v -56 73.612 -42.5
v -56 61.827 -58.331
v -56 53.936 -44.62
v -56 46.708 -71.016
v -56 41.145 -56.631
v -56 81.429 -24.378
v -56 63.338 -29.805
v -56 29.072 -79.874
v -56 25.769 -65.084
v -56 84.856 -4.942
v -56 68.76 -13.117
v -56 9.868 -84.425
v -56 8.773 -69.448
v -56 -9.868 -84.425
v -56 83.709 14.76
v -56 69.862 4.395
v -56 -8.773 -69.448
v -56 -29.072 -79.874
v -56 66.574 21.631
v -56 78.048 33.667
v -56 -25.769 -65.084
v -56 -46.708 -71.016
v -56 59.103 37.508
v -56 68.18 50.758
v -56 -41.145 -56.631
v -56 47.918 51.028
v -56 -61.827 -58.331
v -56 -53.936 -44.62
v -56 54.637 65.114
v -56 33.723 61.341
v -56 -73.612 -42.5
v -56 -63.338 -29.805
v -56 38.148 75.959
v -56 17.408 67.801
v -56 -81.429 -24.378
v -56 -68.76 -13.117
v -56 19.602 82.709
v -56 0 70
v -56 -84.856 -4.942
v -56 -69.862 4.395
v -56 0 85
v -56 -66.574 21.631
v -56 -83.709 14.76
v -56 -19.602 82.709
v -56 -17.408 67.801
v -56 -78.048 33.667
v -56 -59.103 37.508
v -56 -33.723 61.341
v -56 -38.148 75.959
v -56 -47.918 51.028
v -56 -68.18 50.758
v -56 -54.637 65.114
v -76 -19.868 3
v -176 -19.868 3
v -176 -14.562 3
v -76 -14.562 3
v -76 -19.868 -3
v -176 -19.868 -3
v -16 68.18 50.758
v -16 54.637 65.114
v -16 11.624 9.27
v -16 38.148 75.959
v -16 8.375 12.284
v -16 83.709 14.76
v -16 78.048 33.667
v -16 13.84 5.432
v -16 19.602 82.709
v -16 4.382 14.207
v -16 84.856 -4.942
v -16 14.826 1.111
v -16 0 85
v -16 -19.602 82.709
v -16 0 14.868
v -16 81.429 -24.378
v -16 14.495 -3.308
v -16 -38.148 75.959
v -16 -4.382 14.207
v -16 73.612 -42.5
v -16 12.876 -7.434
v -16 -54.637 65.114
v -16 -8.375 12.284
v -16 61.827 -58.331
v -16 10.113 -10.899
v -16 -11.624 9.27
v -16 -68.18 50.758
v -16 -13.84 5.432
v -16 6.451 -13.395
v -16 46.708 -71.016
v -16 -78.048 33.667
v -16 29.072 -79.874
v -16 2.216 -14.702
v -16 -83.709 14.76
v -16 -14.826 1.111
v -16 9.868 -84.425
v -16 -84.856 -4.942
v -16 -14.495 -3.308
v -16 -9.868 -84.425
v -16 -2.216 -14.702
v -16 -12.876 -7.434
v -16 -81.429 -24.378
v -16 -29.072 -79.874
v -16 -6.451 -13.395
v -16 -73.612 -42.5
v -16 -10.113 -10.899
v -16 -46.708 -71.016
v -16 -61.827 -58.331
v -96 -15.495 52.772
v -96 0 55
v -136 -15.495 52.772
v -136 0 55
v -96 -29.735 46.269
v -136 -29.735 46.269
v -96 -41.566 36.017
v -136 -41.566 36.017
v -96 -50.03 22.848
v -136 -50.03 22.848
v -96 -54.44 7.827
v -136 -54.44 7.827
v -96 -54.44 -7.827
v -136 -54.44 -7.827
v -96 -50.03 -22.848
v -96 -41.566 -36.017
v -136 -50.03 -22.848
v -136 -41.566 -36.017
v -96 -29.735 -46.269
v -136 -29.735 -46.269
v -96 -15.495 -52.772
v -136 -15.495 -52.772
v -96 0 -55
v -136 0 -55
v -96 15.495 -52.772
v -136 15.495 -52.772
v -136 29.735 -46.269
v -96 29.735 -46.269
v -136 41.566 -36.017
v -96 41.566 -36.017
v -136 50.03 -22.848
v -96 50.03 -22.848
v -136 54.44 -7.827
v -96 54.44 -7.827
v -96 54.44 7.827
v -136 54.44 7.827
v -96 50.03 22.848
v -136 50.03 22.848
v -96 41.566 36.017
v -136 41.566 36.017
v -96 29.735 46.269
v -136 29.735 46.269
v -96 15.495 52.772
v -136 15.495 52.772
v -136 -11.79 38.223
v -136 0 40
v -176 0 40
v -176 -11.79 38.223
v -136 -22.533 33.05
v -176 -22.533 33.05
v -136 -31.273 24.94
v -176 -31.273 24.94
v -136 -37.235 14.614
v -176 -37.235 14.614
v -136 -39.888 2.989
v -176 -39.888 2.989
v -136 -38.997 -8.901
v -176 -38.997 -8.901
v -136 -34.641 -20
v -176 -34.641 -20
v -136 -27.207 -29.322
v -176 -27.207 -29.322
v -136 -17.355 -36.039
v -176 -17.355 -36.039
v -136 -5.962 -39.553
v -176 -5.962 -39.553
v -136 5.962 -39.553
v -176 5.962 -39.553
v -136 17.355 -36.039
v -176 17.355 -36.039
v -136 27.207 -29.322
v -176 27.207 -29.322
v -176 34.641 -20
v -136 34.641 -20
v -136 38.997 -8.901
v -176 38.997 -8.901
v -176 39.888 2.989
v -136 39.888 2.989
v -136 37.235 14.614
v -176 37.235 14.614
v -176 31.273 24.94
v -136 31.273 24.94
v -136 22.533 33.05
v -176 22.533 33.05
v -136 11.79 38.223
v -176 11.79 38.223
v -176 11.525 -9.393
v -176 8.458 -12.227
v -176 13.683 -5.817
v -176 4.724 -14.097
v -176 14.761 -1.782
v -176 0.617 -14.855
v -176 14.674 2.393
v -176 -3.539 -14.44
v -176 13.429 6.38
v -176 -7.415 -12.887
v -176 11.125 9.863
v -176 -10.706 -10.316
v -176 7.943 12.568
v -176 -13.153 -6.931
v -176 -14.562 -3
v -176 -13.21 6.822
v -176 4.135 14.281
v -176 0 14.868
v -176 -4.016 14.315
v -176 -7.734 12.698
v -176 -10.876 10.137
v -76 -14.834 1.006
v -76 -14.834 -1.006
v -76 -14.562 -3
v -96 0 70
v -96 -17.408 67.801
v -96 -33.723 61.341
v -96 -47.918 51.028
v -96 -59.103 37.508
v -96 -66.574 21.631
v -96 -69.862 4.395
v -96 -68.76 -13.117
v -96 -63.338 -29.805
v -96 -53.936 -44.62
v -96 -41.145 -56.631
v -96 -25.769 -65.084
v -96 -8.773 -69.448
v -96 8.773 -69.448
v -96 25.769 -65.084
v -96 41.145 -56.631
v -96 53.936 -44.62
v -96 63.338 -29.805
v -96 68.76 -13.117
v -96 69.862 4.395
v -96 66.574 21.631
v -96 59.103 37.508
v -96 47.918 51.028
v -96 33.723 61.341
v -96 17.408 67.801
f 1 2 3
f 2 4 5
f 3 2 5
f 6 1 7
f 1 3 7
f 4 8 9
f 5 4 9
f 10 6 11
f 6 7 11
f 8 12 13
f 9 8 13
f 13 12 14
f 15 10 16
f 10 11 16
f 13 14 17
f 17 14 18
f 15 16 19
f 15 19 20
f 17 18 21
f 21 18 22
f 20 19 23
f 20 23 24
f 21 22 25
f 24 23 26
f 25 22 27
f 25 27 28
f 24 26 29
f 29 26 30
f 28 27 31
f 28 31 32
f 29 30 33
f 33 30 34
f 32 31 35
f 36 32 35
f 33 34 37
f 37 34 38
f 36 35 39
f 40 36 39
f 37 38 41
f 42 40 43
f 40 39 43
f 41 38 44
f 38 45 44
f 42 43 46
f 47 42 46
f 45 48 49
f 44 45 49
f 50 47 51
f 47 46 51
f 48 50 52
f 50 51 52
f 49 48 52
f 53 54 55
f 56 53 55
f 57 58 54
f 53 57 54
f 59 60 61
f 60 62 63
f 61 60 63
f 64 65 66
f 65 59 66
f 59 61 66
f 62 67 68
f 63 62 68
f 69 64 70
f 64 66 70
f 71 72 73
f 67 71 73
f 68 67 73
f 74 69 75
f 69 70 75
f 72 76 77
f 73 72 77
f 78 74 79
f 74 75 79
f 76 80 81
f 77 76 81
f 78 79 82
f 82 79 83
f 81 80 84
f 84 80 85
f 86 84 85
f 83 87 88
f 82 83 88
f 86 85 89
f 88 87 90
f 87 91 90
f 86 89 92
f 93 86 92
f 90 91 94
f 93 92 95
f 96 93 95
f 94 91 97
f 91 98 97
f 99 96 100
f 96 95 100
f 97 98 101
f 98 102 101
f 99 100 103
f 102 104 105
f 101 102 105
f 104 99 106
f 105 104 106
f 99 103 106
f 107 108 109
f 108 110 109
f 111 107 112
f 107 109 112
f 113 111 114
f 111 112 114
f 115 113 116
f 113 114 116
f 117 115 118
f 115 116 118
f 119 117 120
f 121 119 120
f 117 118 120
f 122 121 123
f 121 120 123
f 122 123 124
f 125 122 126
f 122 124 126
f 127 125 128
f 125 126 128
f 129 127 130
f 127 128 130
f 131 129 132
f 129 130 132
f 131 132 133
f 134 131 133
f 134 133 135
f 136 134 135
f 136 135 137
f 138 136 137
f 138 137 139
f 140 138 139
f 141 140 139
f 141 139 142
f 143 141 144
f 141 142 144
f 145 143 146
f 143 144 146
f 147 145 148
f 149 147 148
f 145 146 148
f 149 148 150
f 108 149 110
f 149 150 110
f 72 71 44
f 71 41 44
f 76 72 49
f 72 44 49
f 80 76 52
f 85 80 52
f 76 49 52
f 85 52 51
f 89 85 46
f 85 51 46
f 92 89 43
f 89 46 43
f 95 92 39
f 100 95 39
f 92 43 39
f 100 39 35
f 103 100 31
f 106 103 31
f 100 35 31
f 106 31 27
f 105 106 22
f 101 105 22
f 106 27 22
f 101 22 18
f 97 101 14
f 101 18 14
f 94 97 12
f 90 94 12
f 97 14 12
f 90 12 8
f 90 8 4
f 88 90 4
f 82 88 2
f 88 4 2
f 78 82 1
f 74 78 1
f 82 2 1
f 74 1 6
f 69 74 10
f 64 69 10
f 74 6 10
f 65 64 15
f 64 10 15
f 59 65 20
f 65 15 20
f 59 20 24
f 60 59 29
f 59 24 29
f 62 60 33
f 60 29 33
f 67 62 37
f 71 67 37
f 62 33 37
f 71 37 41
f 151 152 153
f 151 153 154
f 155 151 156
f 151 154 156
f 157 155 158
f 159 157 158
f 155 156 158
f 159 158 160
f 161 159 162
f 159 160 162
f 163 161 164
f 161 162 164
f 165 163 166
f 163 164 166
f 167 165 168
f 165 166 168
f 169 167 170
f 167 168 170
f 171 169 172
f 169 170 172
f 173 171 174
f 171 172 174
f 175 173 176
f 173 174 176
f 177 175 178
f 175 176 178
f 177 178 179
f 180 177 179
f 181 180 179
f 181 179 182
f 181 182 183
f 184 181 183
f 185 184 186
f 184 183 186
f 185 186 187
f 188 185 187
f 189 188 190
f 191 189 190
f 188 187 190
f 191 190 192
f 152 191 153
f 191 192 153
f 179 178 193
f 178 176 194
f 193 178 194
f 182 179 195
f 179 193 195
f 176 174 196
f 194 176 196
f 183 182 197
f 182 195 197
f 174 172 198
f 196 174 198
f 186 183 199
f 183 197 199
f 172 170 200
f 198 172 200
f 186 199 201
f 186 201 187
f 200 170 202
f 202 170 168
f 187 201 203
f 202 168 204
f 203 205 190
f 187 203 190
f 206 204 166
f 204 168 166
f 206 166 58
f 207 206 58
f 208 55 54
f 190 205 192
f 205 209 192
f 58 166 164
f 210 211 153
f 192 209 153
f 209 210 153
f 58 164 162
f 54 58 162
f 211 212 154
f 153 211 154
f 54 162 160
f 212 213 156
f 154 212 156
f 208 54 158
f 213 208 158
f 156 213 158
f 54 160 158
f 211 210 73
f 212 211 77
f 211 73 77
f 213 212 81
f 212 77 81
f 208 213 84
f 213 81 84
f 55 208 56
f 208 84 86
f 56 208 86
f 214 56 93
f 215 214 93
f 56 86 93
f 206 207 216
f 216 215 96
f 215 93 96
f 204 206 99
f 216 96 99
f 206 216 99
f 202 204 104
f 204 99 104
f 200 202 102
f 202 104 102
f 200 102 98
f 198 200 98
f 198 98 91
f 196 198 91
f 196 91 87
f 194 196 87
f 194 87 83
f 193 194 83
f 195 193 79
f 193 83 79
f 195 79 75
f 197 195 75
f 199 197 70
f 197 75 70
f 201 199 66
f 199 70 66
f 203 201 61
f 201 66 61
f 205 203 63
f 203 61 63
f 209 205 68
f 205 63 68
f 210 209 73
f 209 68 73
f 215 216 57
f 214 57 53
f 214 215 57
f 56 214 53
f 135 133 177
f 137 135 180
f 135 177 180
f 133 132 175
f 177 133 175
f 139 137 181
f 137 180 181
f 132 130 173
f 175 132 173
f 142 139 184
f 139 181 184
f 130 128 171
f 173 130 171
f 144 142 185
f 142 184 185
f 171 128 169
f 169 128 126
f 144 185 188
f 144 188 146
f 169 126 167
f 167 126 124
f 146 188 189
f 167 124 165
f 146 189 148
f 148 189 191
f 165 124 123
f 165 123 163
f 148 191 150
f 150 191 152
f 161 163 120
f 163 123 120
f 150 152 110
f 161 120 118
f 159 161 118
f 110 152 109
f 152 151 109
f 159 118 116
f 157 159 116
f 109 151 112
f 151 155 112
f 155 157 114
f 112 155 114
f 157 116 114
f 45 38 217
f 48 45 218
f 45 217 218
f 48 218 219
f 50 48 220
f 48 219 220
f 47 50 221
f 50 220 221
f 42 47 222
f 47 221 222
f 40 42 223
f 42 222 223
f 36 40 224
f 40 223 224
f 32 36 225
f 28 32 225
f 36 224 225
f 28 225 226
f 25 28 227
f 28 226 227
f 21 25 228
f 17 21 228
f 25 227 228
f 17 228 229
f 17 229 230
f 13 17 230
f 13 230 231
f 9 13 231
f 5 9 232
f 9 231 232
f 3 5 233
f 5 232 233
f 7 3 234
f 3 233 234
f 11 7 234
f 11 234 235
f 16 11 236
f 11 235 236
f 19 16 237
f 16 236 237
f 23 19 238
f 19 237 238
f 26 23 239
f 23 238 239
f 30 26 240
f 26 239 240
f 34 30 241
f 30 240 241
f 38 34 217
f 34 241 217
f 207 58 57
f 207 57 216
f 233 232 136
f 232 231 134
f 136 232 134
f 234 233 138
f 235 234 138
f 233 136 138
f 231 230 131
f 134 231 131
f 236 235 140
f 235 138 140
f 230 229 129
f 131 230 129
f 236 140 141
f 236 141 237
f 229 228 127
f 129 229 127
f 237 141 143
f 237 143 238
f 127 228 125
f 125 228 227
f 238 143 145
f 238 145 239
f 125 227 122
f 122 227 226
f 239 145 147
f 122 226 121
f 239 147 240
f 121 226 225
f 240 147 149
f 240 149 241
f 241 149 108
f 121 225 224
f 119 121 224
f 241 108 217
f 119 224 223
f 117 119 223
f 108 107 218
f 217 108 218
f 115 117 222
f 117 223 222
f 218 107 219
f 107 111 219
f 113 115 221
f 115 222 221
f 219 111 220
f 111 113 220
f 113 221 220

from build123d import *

# Parameters (mm, degrees)
SKETCH2_W          = 6
SKETCH2_H          = 10
CUT_EXTRUDE3_DEPTH = 100


with BuildPart() as part:
    # Sketch1 → Revolve2 (revolve)
    with BuildSketch(Plane.XY, mode=Mode.PRIVATE) as revolve2_sk:
        Polygon((-45.142857143, 22.857142857), (-176, 22.857142857), (-176, 14.867713129), (-16, 14.867713129), (-16, 22.857142857), align=None)
        Polygon((-136, 40), (-176, 40), (-176, 22.857142857), (-45.142857143, 22.857142857), (-45.142857143, 37.142857143), (-128, 37.142857143), (-128, 47), (-88, 47), (-88, 62), (-48, 62), (-48, 77), (-16, 77), (-16, 85), (-56, 85), (-56, 70), (-96, 70), (-96, 55), (-136, 55), align=None)
        Polygon((-45.142857143, 37.142857143), (-45.142857143, 22.857142857), (-16, 22.857142857), (-16, 77), (-48, 77), (-48, 62), (-88, 62), (-88, 47), (-128, 47), (-128, 37.142857143), align=None)
    revolve(revolve2_sk.sketch.rotate(Axis((-176, 0, 0), (1, 0, 0)), 90), axis=Axis((-176, 0, 0), (1, 0, 0)))

    # Sketch2 → Cut-Extrude3 (cut)
    with BuildSketch(Plane.ZY.offset(176)):
        with Locations((0, -14.867713129)):
            Rectangle(SKETCH2_W, SKETCH2_H)
    extrude(amount=-CUT_EXTRUDE3_DEPTH, mode=Mode.SUBTRACT)


solid = part.part
